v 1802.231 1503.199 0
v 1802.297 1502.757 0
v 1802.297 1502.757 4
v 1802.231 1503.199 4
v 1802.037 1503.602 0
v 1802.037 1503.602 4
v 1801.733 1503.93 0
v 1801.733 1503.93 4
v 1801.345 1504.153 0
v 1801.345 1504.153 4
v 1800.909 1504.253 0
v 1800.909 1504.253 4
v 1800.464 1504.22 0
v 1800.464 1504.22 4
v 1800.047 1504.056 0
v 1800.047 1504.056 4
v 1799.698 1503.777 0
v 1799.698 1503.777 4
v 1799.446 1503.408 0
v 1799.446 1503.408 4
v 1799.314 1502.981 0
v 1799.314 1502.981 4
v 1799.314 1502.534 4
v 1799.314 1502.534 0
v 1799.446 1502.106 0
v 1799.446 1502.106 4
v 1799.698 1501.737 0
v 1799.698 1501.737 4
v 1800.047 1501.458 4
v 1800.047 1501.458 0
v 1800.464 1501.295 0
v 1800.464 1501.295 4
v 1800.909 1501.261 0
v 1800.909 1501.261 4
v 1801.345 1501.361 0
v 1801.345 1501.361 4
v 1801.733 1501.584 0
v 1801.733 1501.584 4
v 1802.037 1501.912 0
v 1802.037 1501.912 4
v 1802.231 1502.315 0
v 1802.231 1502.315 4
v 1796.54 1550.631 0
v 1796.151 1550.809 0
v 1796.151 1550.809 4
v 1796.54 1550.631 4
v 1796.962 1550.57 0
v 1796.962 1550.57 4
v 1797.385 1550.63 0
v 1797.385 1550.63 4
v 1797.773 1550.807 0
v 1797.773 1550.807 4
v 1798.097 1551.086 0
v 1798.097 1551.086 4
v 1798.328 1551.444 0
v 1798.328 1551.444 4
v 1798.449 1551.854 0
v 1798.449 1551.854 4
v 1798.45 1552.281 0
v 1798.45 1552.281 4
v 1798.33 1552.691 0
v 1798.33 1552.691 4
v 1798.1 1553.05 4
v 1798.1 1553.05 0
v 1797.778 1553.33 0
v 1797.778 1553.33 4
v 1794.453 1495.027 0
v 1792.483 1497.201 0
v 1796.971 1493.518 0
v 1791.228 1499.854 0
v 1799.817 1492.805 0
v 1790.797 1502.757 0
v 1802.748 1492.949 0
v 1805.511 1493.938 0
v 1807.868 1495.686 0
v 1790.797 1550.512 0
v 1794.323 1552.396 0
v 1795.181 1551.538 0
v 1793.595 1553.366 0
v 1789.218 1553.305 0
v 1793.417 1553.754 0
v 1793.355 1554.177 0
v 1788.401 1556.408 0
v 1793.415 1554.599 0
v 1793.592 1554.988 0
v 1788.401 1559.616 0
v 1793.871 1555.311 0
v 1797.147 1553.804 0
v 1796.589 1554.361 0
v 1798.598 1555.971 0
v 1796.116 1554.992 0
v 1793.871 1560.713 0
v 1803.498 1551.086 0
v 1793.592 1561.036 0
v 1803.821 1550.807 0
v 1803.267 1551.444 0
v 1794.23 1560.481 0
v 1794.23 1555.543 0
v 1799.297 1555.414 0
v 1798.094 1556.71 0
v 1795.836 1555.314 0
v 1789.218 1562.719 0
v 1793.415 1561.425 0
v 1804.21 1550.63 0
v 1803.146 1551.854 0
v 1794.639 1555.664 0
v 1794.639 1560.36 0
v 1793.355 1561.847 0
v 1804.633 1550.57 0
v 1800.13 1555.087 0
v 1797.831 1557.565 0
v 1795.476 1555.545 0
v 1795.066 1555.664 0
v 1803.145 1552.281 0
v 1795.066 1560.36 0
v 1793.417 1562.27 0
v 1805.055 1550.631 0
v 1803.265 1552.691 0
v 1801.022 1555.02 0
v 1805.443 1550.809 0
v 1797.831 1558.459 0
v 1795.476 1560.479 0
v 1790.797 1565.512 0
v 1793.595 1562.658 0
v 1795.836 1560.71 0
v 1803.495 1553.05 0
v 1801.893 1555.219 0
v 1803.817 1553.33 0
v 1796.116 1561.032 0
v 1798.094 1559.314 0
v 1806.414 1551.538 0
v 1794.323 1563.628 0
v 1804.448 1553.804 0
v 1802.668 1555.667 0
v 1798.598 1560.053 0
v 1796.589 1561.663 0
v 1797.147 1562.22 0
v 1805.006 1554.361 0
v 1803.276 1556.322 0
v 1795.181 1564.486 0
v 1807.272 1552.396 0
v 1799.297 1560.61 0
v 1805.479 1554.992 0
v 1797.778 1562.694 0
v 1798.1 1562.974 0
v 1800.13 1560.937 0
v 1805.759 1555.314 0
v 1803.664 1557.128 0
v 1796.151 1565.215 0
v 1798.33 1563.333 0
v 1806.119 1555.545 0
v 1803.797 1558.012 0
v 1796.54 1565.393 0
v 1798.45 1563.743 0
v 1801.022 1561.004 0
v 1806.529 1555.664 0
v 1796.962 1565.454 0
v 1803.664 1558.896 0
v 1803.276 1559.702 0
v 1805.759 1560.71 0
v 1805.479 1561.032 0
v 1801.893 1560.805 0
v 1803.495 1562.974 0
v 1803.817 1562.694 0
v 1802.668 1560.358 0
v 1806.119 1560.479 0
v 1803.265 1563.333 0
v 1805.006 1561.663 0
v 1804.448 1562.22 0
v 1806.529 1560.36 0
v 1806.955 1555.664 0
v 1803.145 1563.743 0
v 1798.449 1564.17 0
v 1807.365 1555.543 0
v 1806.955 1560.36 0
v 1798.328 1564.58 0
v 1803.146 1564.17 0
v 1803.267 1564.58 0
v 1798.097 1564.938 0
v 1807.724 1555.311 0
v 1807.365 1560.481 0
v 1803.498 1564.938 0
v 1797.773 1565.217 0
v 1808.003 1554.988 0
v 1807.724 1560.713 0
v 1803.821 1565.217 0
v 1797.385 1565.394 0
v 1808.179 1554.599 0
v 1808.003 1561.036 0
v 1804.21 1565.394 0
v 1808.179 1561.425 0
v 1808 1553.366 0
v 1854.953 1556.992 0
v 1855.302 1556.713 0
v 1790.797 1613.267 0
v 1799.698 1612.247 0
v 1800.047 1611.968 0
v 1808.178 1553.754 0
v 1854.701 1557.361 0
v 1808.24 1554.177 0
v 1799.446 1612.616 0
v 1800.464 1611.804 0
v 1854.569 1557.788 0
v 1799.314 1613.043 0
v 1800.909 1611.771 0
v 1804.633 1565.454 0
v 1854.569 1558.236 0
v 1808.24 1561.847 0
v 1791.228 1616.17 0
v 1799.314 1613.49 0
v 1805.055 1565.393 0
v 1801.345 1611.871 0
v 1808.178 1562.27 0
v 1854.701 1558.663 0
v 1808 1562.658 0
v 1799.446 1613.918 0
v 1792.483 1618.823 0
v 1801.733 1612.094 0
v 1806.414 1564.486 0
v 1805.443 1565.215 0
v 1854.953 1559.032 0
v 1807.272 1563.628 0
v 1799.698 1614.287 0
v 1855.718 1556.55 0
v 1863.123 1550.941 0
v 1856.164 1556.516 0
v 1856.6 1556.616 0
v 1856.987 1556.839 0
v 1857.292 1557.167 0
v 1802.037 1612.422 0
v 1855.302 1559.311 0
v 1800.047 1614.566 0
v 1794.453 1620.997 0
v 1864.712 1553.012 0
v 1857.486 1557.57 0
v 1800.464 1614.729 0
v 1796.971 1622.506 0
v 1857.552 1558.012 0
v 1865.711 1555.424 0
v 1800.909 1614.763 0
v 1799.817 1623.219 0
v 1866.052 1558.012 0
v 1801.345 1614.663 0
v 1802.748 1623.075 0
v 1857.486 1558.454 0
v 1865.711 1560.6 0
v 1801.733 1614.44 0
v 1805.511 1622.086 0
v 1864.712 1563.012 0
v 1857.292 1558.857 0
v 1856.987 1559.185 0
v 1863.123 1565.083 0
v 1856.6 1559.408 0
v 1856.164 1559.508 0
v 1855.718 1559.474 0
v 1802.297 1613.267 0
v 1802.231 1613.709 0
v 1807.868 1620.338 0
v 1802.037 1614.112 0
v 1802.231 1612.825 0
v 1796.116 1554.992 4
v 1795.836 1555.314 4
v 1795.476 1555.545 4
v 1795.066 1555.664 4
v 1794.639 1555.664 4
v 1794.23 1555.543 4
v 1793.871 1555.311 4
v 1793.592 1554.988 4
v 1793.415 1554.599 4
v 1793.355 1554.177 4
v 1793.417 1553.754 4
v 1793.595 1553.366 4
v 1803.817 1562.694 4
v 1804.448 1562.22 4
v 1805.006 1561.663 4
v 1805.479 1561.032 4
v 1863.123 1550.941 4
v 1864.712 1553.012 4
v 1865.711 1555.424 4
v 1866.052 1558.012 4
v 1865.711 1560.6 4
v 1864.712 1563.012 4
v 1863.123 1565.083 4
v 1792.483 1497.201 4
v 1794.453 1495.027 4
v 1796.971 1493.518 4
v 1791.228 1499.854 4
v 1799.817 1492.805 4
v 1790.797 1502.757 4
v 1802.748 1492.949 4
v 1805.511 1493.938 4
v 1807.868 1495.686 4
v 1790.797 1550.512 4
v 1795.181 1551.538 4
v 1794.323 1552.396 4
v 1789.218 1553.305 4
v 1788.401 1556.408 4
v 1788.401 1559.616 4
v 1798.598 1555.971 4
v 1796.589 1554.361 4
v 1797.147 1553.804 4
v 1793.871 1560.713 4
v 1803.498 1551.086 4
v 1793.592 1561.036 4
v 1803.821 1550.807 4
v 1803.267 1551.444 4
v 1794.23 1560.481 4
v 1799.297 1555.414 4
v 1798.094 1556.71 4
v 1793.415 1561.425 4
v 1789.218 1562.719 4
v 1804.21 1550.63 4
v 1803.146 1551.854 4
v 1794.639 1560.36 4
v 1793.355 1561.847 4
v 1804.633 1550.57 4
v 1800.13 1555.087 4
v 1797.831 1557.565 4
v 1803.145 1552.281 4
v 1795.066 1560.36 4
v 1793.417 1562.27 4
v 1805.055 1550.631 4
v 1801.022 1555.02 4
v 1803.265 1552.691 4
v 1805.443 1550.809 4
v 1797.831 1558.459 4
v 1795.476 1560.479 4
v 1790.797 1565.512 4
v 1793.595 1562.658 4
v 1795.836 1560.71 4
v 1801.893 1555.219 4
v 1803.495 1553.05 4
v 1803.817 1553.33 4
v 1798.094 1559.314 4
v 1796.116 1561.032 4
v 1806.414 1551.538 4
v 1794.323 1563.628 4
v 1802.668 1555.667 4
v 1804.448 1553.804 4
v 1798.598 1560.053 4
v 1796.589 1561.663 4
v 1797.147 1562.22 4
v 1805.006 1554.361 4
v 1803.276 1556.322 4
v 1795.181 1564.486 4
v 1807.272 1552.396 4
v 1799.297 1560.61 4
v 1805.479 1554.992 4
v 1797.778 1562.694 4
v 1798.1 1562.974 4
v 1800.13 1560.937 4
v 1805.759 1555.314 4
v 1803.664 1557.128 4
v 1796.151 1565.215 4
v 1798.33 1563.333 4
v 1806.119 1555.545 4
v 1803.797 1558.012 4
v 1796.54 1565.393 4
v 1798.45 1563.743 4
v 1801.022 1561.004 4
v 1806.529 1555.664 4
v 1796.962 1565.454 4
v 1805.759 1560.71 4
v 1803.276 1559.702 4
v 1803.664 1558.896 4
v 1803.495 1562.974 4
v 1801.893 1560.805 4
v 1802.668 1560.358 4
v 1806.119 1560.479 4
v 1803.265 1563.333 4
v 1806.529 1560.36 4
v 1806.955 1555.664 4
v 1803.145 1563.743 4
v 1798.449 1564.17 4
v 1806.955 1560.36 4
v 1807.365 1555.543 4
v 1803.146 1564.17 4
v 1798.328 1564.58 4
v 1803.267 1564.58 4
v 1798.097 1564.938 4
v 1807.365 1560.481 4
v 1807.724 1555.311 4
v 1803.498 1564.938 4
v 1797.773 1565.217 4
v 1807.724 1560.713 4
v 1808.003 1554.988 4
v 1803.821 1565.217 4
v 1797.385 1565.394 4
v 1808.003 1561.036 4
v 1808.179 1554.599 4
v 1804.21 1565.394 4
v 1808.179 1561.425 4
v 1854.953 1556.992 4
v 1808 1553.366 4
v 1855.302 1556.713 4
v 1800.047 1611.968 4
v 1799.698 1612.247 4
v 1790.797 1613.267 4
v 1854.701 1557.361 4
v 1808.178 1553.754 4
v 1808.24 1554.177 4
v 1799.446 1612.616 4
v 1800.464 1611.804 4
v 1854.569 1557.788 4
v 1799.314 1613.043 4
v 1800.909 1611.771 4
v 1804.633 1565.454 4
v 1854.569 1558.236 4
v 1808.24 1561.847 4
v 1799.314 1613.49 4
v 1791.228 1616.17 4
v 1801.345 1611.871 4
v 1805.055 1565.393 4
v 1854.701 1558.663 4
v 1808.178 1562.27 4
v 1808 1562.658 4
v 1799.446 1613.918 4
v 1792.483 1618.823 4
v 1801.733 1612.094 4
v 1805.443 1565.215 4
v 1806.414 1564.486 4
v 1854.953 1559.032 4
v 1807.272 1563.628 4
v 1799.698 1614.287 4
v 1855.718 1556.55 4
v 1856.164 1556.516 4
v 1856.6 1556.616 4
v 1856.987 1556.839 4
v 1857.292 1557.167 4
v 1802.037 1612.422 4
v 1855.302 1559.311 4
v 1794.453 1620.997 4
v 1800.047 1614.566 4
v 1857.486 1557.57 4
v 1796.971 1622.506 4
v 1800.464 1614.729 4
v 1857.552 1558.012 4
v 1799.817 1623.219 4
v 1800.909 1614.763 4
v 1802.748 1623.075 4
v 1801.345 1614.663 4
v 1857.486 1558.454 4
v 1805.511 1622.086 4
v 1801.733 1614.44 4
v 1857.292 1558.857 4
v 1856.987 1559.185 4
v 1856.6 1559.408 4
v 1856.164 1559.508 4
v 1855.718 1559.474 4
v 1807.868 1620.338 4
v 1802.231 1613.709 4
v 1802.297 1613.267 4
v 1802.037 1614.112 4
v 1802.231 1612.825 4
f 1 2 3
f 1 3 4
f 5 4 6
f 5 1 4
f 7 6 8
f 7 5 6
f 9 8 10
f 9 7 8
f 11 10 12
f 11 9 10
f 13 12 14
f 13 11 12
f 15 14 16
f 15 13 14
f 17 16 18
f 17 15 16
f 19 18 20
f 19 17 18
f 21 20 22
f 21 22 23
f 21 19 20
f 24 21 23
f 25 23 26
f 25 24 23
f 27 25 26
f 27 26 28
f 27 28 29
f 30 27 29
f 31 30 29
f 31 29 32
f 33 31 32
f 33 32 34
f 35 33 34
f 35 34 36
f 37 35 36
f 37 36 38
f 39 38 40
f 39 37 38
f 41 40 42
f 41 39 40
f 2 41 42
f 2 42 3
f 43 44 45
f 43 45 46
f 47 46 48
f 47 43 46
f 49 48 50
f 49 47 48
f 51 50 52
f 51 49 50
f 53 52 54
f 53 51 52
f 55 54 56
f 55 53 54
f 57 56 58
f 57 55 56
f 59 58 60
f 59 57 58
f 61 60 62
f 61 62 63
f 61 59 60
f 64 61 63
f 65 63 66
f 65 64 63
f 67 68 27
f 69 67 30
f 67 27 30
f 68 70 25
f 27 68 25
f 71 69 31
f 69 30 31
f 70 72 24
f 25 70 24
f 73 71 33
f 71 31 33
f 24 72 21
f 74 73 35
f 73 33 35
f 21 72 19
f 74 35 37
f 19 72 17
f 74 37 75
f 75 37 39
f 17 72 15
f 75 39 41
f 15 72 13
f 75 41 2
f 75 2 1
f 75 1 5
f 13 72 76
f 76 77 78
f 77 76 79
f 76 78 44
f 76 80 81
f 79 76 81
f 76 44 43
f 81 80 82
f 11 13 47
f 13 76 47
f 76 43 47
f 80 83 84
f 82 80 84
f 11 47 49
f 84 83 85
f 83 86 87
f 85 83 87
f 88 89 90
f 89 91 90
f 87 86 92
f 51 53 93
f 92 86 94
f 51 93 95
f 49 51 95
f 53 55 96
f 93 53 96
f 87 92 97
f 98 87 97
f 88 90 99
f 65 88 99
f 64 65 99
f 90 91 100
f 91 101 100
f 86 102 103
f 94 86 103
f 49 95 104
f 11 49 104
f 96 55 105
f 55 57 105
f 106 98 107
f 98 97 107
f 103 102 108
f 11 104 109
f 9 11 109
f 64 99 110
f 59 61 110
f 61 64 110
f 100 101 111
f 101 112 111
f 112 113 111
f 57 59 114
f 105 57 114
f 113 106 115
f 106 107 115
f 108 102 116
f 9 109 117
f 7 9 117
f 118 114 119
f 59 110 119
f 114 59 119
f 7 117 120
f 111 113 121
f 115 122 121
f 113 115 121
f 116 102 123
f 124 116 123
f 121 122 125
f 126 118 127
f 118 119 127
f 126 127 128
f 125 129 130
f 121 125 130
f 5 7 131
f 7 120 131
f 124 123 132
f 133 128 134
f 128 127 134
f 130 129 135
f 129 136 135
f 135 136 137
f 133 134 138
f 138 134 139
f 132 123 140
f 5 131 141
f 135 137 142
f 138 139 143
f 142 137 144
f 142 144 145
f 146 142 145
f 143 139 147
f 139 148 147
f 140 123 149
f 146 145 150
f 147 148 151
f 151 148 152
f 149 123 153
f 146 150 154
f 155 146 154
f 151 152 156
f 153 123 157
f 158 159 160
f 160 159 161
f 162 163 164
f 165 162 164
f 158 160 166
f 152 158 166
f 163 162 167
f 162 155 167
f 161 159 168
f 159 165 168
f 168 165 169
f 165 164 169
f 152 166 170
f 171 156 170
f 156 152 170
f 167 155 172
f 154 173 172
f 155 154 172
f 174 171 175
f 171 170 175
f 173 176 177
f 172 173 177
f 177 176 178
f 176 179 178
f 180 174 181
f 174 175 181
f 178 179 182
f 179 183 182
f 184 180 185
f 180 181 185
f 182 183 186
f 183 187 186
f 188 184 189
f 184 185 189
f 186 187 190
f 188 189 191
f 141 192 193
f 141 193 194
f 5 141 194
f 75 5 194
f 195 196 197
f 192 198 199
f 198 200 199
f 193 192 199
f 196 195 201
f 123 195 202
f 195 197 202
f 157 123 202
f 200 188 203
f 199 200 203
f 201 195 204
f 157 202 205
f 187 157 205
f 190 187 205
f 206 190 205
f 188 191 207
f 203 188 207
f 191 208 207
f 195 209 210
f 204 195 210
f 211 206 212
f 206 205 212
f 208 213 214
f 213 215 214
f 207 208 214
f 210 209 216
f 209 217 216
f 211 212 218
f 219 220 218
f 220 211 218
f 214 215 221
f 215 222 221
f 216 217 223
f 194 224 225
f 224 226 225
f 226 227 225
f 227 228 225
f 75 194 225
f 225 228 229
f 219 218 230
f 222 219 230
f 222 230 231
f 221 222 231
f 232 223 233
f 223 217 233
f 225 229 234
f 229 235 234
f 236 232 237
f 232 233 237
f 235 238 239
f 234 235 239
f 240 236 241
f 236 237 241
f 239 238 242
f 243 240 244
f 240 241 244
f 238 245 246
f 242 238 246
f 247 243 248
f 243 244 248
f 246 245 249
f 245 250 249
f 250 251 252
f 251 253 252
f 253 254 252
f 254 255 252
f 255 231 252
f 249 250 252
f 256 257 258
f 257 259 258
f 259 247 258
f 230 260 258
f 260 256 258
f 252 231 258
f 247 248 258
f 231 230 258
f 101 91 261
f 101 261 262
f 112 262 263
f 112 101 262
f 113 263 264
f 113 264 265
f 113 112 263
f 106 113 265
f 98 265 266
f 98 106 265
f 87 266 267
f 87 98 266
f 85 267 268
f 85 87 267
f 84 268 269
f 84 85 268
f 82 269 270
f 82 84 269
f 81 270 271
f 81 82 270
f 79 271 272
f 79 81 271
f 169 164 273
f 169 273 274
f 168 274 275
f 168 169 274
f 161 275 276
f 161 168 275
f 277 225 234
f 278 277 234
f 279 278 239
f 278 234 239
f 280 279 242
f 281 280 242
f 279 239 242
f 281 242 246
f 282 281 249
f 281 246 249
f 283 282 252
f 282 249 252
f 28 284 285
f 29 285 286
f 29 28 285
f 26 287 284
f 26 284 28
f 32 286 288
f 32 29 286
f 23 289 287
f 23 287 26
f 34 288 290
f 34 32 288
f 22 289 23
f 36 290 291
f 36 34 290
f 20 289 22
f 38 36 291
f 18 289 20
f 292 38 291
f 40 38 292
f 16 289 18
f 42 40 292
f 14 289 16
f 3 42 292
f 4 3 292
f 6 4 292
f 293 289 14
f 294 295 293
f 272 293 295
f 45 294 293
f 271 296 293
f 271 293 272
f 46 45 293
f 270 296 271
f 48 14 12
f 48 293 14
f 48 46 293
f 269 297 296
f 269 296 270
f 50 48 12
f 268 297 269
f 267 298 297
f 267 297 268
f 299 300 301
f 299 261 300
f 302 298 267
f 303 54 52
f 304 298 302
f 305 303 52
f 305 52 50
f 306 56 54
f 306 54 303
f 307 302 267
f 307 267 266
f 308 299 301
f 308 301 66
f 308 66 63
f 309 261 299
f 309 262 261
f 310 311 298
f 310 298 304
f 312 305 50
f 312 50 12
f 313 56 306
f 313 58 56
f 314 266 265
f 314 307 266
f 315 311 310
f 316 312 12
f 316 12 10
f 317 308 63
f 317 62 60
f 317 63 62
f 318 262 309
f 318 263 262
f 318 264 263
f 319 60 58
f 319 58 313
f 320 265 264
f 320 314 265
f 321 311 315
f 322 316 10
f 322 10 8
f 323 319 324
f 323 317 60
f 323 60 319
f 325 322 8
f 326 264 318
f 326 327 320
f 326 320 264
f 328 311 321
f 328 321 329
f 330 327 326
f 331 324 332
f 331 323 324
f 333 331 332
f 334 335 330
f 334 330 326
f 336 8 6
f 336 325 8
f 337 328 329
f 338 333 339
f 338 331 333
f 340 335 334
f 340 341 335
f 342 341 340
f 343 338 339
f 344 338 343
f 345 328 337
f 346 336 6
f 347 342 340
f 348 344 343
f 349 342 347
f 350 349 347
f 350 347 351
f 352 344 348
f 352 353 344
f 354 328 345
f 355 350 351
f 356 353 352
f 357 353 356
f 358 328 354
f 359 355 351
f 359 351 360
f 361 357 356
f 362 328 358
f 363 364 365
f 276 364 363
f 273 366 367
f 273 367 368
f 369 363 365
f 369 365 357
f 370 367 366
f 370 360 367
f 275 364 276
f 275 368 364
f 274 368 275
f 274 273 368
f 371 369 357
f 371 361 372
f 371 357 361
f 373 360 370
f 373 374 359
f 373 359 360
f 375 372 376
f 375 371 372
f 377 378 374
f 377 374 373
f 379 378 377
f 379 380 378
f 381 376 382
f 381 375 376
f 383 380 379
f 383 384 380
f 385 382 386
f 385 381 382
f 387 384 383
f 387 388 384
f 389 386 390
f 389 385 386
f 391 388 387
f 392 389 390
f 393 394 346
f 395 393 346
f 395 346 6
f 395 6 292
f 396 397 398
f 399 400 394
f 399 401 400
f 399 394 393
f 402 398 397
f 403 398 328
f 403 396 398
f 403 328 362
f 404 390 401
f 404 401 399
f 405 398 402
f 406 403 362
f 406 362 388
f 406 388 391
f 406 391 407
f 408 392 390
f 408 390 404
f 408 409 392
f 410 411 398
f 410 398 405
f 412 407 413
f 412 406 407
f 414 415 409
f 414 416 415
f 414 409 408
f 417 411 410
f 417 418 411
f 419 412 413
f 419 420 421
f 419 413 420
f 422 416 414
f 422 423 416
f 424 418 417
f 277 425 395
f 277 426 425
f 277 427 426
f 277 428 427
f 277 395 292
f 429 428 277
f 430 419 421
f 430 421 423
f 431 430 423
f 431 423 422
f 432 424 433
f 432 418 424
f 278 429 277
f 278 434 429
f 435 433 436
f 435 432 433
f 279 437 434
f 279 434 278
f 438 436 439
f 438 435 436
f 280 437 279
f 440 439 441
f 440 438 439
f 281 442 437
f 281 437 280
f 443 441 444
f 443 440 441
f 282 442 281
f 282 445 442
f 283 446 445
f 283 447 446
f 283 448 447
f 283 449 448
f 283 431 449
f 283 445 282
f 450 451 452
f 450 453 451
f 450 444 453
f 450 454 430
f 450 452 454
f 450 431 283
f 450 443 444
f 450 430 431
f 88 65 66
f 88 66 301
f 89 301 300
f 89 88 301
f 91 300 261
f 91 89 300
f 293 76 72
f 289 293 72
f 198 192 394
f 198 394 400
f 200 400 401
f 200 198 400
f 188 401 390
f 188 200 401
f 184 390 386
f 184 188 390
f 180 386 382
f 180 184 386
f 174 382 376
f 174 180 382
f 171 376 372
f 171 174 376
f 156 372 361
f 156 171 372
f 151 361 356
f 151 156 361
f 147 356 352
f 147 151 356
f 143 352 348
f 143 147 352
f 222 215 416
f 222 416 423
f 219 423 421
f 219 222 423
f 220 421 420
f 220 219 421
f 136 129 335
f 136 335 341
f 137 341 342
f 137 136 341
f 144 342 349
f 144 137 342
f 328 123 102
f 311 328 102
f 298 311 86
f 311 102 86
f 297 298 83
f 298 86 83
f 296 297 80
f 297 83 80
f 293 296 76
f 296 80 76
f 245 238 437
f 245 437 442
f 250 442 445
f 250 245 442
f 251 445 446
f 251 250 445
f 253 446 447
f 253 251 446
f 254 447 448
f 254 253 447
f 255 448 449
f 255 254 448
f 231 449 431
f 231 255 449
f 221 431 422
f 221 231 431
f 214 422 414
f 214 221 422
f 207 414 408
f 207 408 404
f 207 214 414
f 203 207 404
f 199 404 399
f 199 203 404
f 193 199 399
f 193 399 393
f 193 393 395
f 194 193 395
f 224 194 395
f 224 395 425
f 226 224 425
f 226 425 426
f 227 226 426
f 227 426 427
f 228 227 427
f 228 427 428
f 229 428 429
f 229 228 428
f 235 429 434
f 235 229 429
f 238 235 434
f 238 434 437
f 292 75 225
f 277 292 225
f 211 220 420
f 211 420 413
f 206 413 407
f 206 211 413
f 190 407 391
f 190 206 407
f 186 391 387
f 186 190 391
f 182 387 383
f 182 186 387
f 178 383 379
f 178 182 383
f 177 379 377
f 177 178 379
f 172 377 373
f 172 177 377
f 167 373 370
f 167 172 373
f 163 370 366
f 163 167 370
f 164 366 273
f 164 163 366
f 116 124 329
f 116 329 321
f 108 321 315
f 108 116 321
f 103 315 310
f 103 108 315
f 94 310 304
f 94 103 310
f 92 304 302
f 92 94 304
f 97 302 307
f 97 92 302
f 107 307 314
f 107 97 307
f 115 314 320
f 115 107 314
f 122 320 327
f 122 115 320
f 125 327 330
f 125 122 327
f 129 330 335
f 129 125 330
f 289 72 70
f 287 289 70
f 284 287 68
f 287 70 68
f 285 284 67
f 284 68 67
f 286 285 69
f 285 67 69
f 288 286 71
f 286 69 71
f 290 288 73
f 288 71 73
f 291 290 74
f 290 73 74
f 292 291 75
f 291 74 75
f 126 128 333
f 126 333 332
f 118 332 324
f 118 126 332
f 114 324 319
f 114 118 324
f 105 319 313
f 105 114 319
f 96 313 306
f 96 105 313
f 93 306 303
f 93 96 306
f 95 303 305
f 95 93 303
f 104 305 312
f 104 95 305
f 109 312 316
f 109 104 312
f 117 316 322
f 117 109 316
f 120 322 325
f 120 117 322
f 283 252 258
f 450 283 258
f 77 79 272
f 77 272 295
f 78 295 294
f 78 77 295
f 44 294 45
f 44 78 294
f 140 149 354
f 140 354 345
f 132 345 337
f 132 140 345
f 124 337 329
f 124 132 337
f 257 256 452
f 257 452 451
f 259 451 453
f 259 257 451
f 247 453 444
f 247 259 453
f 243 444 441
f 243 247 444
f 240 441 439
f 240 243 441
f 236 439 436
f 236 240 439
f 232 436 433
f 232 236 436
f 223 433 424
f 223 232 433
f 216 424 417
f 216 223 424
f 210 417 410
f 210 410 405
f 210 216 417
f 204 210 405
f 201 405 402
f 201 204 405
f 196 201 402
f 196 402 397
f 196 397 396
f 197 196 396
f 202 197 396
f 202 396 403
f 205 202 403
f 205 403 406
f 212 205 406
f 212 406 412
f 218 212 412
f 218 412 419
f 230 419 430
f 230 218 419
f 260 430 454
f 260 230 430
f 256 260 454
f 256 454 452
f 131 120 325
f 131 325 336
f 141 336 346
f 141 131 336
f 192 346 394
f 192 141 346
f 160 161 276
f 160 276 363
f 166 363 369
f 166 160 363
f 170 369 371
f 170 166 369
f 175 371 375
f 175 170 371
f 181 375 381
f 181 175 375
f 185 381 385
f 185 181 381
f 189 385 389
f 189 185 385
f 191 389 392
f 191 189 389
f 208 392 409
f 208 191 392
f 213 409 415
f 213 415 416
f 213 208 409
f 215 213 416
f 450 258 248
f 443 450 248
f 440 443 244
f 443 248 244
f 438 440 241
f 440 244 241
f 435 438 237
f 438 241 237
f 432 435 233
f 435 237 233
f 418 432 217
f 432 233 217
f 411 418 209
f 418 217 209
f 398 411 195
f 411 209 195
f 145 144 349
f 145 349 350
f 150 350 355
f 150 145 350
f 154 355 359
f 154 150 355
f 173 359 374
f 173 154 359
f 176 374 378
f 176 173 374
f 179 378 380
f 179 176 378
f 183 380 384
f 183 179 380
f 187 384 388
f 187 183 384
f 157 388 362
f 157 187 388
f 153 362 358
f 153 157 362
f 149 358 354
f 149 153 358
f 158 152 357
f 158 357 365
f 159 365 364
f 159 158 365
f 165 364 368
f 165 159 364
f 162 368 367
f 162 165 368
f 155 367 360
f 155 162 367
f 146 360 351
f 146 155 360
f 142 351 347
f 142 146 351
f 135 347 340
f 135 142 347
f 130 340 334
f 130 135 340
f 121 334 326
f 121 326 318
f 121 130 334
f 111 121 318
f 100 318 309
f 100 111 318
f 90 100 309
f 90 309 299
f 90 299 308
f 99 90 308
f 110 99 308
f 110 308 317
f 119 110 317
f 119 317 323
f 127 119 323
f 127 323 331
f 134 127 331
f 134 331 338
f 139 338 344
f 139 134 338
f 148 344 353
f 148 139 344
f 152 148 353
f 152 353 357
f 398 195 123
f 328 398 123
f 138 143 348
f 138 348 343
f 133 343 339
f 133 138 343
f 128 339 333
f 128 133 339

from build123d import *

# Parameters (mm, degrees)
SKETCH_1_R      = 3
SKETCH_1_R_2    = 1.5
EXTRUDE_1_DEPTH = 4


with BuildPart() as part:
    # 草图1 → 凸台-拉伸1 (new body)
    with BuildSketch(Plane.XY):
        with BuildLine():
            Line((1790.797367784, 1613.266845989), (1790.797367784, 1565.512011993))
            ThreePointArc((1790.797367784, 1565.512011993), (1788.297367784, 1558.012011993), (1790.797367784, 1550.512011993))
            Line((1790.797367784, 1550.512011993), (1790.797367784, 1502.757177997))
            ThreePointArc((1790.797367784, 1502.757177997), (1796.970533461, 1493.518382672), (1807.868435596, 1495.686110185))
            Line((1807.868435596, 1495.686110185), (1863.123269592, 1550.940944181))
            ThreePointArc((1863.123269592, 1550.940944181), (1866.05220178, 1558.012011993), (1863.123269592, 1565.083079805))
            Line((1863.123269592, 1565.083079805), (1807.868435596, 1620.337913801))
            ThreePointArc((1807.868435596, 1620.337913801), (1796.970533461, 1622.505641314), (1790.797367784, 1613.266845989))
        make_face()
        with Locations((1800.797367784, 1558.012011993)):
            Circle(SKETCH_1_R, mode=Mode.SUBTRACT)
        with Locations((1800.797367784, 1613.266845989)):
            Circle(SKETCH_1_R_2, mode=Mode.SUBTRACT)
        with Locations((1856.05220178, 1558.012011993)):
            Circle(SKETCH_1_R_2, mode=Mode.SUBTRACT)
        with Locations((1800.797367784, 1502.757177997)):
            Circle(SKETCH_1_R_2, mode=Mode.SUBTRACT)
        with BuildLine():
            ThreePointArc((1805.443255224, 1550.809308797), (1806.858027956, 1551.951351821), (1808.000070981, 1553.366124554))
            ThreePointArc((1808.000070981, 1553.366124554), (1807.55260939, 1555.43971519), (1805.479018754, 1554.992253599))
            ThreePointArc((1805.479018754, 1554.992253599), (1804.736707613, 1554.072672165), (1803.817126178, 1553.330361023))
            ThreePointArc((1803.817126178, 1553.330361023), (1803.369664588, 1551.256770387), (1805.443255224, 1550.809308797))
        make_face(mode=Mode.SUBTRACT)
        with BuildLine():
            ThreePointArc((1808.000070981, 1562.657899433), (1806.858027956, 1564.072672165), (1805.443255224, 1565.21471519))
            ThreePointArc((1805.443255224, 1565.21471519), (1803.369664588, 1564.767253599), (1803.817126178, 1562.693662963))
            ThreePointArc((1803.817126178, 1562.693662963), (1804.736707613, 1561.951351821), (1805.479018754, 1561.031770387))
            ThreePointArc((1805.479018754, 1561.031770387), (1807.55260939, 1560.584308797), (1808.000070981, 1562.657899433))
        make_face(mode=Mode.SUBTRACT)
        with BuildLine():
            ThreePointArc((1796.151480345, 1565.21471519), (1794.736707613, 1564.072672165), (1793.594664588, 1562.657899433))
            ThreePointArc((1793.594664588, 1562.657899433), (1794.042126178, 1560.584308797), (1796.115716814, 1561.031770387))
            ThreePointArc((1796.115716814, 1561.031770387), (1796.858027956, 1561.951351821), (1797.77760939, 1562.693662963))
            ThreePointArc((1797.77760939, 1562.693662963), (1798.225070981, 1564.767253599), (1796.151480345, 1565.21471519))
        make_face(mode=Mode.SUBTRACT)
        with BuildLine():
            ThreePointArc((1793.594664588, 1553.366124554), (1794.736707613, 1551.951351821), (1796.151480345, 1550.809308797))
            ThreePointArc((1796.151480345, 1550.809308797), (1798.225070981, 1551.256770387), (1797.77760939, 1553.330361023))
            ThreePointArc((1797.77760939, 1553.330361023), (1796.858027956, 1554.072672165), (1796.115716814, 1554.992253599))
            ThreePointArc((1796.115716814, 1554.992253599), (1794.042126178, 1555.43971519), (1793.594664588, 1553.366124554))
        make_face(mode=Mode.SUBTRACT)
    extrude(amount=EXTRUDE_1_DEPTH)


solid = part.part
